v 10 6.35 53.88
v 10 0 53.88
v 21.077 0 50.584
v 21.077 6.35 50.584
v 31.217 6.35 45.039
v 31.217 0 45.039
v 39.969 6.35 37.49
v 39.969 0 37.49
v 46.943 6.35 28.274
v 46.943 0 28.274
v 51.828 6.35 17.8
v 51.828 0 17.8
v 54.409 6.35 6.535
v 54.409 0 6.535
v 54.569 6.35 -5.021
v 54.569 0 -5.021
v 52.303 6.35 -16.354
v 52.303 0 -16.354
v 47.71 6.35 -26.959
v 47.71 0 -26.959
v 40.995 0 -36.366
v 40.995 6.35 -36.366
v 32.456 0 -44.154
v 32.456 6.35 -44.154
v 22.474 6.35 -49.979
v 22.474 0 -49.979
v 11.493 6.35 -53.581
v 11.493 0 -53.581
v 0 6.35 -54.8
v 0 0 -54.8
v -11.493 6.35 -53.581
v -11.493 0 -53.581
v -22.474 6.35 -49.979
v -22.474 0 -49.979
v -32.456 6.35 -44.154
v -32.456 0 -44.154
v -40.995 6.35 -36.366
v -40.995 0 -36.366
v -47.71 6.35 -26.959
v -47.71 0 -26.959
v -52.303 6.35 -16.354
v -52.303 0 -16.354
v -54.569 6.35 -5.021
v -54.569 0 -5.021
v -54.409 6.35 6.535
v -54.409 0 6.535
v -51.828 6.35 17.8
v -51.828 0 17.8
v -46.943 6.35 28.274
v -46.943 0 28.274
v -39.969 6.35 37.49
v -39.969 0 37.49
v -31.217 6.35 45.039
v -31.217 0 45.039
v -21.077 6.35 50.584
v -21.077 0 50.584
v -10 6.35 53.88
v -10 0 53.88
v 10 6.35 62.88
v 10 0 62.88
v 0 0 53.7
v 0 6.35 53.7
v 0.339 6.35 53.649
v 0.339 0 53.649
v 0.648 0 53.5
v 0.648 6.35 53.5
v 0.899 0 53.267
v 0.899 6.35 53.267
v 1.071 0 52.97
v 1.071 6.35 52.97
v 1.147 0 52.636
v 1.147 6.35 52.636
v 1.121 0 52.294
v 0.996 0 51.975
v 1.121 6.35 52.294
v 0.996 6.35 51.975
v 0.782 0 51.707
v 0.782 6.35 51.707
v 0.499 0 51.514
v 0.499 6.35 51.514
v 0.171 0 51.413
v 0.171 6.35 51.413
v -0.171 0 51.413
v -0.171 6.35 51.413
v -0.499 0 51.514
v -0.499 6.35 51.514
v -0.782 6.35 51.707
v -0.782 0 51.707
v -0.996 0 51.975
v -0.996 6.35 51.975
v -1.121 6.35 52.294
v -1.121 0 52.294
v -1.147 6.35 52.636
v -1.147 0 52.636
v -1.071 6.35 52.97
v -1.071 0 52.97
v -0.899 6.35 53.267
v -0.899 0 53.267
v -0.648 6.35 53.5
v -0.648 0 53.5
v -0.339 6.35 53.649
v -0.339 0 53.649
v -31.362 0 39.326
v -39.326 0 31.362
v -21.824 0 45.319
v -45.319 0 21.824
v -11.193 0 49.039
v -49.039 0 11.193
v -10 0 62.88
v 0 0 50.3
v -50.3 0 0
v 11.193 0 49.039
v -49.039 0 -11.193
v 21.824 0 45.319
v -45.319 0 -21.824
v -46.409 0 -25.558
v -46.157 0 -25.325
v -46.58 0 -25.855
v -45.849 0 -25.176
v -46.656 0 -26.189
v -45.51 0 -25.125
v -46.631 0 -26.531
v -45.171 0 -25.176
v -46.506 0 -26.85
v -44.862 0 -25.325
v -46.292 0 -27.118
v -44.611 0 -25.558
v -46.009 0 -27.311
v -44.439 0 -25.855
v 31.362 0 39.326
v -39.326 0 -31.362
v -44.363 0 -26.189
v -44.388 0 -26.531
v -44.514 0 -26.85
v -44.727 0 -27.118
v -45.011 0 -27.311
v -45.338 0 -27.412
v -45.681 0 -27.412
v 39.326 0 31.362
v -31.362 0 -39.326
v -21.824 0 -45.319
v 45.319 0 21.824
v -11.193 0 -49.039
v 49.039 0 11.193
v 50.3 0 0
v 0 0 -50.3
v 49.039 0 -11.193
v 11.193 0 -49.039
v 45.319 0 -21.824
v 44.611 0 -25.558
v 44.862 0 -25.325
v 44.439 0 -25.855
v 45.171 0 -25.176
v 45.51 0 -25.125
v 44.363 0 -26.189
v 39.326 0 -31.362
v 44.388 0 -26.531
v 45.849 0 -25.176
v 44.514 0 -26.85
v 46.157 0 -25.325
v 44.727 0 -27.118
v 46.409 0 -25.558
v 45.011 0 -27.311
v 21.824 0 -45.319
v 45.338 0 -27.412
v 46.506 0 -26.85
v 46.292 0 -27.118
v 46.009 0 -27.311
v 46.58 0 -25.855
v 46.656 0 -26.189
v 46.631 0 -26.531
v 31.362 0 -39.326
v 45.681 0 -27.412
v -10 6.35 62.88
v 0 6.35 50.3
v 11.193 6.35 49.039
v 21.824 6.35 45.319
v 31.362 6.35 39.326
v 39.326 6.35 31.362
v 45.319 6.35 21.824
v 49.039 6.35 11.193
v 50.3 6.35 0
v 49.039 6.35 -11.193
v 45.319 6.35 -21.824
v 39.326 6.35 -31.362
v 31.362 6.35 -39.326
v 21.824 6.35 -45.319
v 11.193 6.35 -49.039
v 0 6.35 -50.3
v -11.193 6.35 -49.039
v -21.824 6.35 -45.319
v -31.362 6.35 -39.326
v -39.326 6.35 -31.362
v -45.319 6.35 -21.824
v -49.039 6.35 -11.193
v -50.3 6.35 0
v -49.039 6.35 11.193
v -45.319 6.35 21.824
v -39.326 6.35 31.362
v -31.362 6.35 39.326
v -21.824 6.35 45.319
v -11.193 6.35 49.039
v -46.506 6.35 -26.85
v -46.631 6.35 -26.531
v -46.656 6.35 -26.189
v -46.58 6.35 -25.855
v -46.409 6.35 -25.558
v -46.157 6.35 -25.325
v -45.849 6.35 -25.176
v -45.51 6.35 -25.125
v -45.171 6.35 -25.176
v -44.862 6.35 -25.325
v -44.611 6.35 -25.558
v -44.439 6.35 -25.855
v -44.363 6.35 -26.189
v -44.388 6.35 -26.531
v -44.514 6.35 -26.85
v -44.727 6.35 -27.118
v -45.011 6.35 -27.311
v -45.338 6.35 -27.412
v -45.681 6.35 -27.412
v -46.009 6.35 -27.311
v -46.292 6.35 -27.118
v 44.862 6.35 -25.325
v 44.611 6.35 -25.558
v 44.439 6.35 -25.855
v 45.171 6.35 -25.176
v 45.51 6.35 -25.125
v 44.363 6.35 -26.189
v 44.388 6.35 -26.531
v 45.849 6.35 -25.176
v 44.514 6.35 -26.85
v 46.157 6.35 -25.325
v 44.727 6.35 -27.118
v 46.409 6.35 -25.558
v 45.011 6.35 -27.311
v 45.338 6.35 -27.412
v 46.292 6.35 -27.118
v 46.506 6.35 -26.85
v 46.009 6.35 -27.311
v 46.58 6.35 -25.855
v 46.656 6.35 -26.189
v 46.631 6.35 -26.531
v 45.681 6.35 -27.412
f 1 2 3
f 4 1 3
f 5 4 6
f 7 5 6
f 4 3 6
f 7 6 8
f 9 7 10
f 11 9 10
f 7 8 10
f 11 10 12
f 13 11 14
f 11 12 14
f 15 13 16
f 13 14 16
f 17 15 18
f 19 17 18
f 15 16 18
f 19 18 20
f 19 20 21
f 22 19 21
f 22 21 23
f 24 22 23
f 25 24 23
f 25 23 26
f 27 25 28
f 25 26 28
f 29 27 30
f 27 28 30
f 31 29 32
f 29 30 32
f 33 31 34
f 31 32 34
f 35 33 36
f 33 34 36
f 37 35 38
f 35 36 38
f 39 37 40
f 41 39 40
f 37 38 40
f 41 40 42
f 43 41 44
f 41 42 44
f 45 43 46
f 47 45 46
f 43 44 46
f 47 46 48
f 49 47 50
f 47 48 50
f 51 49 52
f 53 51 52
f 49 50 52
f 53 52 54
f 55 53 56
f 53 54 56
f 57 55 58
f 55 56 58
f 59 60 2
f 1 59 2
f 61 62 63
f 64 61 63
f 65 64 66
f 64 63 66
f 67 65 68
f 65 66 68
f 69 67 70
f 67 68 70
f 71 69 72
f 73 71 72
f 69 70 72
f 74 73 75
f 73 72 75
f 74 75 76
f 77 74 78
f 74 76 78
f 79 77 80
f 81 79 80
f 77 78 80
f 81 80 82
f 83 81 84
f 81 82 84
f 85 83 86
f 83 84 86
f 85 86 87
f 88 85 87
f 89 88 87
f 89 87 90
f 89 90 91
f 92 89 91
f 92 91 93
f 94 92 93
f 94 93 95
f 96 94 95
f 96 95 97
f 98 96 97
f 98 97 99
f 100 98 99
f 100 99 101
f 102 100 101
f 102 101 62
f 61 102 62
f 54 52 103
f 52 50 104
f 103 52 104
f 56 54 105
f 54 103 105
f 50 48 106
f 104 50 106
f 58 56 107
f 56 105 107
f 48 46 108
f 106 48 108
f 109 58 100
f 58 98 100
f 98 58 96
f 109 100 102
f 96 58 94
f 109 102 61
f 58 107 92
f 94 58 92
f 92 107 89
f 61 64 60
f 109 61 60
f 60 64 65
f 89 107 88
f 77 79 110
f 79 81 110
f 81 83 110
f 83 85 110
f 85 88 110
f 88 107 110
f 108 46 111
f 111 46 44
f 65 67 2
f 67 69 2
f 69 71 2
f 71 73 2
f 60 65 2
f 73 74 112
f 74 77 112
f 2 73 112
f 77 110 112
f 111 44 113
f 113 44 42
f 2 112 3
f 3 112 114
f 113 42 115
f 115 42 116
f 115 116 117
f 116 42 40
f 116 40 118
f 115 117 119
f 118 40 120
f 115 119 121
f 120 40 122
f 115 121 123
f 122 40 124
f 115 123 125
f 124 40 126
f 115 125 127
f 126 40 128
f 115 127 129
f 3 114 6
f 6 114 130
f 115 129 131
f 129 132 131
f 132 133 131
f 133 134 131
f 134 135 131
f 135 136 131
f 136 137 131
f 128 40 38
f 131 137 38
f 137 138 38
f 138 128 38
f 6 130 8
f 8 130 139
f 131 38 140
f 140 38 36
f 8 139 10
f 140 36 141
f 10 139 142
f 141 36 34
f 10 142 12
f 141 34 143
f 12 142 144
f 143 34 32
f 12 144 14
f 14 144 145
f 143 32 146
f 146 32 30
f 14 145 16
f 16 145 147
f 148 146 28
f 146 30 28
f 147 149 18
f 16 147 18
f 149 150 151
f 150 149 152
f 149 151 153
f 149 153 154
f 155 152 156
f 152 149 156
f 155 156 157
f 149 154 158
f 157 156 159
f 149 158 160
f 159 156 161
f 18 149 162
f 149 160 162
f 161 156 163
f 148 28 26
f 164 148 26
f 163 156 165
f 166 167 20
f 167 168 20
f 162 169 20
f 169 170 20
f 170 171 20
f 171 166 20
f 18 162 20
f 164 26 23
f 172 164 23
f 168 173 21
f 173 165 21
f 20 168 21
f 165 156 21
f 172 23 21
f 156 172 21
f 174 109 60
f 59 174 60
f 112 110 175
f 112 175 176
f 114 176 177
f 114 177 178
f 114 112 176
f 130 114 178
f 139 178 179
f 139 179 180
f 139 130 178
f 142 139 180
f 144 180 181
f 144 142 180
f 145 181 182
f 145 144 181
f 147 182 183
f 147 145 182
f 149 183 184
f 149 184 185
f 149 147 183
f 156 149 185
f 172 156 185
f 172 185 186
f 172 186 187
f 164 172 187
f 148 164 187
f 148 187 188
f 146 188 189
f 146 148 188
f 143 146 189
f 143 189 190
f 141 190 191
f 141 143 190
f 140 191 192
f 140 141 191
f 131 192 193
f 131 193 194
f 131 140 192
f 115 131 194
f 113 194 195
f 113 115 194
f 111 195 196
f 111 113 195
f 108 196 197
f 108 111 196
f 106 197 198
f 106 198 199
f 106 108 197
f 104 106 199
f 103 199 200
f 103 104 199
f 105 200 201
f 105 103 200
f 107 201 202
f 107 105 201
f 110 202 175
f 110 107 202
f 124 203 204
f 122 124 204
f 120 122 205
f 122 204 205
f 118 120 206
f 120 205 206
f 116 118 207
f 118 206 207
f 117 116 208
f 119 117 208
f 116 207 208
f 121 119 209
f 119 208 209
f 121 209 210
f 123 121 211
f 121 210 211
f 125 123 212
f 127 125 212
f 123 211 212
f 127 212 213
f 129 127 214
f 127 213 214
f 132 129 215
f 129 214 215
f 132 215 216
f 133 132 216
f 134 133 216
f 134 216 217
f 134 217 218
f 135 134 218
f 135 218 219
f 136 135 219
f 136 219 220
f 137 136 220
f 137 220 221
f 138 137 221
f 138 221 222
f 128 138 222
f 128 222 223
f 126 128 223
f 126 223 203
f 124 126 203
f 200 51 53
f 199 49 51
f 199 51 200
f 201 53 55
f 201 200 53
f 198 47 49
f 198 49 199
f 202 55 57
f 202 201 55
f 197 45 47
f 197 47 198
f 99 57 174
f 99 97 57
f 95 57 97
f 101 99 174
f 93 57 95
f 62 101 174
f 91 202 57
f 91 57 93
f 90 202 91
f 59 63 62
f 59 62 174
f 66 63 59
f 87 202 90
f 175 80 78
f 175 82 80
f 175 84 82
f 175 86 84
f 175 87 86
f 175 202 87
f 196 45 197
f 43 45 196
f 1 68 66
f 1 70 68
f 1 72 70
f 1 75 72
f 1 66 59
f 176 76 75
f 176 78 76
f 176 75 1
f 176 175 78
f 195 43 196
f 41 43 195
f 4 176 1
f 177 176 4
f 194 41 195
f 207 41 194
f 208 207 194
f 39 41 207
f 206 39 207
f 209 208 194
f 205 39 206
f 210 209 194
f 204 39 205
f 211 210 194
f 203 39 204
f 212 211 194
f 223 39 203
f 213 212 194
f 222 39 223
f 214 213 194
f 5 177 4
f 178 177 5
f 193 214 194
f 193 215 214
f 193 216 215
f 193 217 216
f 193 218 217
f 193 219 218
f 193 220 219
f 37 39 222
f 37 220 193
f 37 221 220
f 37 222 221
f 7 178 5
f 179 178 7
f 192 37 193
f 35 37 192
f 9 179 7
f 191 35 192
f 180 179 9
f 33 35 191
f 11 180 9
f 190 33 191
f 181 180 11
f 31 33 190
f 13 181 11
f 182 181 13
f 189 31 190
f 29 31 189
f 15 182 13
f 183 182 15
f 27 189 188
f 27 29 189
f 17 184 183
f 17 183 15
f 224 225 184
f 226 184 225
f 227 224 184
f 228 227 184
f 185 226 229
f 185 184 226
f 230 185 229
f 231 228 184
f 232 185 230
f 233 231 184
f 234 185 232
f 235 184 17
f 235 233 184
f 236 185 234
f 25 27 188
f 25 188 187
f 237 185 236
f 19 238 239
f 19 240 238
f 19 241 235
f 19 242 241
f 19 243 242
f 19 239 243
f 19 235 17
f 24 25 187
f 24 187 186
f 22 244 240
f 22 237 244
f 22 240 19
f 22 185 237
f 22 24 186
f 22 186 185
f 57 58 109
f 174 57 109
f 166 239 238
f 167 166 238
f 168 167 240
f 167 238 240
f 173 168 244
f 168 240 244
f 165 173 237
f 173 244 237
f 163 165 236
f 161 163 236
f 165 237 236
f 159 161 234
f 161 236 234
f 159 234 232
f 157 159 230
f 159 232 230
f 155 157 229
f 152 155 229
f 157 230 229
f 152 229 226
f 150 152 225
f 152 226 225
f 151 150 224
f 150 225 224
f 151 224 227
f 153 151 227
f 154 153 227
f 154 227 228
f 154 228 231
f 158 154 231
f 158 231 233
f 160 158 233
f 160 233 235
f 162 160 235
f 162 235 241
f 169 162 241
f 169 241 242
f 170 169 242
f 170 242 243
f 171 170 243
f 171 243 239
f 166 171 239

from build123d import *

# Parameters (mm, degrees)
SKETCH1_R           = 50.3
BOSS_EXTRUDE1_DEPTH = 6.35
CUT_EXTRUDE1_REACH  = 85.65
SKETCH2_R           = 1.15
CIRPATTERN1_COUNT   = 3


with BuildPart() as part:
    # Sketch1 → Boss-Extrude1 (new body)
    with BuildSketch(Plane(origin=(0, 0, 0), x_dir=(1, 0, 0), z_dir=(0, 1, 0))):
        with BuildLine():
            Line((-10, -53.87986637), (-10, -62.87986637))
            Line((-10, -62.87986637), (10, -62.87986637))
            Line((10, -62.87986637), (10, -53.87986637))
            ThreePointArc((10, -53.87986637), (0, 54.8), (-10, -53.87986637))
        make_face()
        with Locations(Location((0, 0, 0), (0, 0, 270))):
            Circle(SKETCH1_R, mode=Mode.SUBTRACT)
    extrude(amount=BOSS_EXTRUDE1_DEPTH)

    # Sketch2 → Cut-Extrude1 (cut, up to next)
    with BuildSketch(Plane(origin=(0, 6.35, 0), x_dir=(1, 0, 0), z_dir=(0, 1, 0)), mode=Mode.PRIVATE) as cut_extrude1_sk1:
        with Locations(Location((0, -52.55, 0), (0, 0, 270))):
            Circle(SKETCH2_R)
    cut_extrude1_tool1 = extrude(cut_extrude1_sk1.sketch, amount=-CUT_EXTRUDE1_REACH, mode=Mode.PRIVATE) & part.part
    cut_extrude1 = cut_extrude1_tool1.solids().sort_by_distance((0, 6.35, 52.55))[0]
    add(cut_extrude1, mode=Mode.SUBTRACT)

    # CirPattern1: Cut-Extrude1 ×3 about axis
    cirpattern1_axis = Axis((0, 0, 0), (0, 1, 0))
    for i in range(1, CIRPATTERN1_COUNT):
        add(cut_extrude1.rotate(cirpattern1_axis, i * 360 / CIRPATTERN1_COUNT), mode=Mode.SUBTRACT)


solid = part.part
